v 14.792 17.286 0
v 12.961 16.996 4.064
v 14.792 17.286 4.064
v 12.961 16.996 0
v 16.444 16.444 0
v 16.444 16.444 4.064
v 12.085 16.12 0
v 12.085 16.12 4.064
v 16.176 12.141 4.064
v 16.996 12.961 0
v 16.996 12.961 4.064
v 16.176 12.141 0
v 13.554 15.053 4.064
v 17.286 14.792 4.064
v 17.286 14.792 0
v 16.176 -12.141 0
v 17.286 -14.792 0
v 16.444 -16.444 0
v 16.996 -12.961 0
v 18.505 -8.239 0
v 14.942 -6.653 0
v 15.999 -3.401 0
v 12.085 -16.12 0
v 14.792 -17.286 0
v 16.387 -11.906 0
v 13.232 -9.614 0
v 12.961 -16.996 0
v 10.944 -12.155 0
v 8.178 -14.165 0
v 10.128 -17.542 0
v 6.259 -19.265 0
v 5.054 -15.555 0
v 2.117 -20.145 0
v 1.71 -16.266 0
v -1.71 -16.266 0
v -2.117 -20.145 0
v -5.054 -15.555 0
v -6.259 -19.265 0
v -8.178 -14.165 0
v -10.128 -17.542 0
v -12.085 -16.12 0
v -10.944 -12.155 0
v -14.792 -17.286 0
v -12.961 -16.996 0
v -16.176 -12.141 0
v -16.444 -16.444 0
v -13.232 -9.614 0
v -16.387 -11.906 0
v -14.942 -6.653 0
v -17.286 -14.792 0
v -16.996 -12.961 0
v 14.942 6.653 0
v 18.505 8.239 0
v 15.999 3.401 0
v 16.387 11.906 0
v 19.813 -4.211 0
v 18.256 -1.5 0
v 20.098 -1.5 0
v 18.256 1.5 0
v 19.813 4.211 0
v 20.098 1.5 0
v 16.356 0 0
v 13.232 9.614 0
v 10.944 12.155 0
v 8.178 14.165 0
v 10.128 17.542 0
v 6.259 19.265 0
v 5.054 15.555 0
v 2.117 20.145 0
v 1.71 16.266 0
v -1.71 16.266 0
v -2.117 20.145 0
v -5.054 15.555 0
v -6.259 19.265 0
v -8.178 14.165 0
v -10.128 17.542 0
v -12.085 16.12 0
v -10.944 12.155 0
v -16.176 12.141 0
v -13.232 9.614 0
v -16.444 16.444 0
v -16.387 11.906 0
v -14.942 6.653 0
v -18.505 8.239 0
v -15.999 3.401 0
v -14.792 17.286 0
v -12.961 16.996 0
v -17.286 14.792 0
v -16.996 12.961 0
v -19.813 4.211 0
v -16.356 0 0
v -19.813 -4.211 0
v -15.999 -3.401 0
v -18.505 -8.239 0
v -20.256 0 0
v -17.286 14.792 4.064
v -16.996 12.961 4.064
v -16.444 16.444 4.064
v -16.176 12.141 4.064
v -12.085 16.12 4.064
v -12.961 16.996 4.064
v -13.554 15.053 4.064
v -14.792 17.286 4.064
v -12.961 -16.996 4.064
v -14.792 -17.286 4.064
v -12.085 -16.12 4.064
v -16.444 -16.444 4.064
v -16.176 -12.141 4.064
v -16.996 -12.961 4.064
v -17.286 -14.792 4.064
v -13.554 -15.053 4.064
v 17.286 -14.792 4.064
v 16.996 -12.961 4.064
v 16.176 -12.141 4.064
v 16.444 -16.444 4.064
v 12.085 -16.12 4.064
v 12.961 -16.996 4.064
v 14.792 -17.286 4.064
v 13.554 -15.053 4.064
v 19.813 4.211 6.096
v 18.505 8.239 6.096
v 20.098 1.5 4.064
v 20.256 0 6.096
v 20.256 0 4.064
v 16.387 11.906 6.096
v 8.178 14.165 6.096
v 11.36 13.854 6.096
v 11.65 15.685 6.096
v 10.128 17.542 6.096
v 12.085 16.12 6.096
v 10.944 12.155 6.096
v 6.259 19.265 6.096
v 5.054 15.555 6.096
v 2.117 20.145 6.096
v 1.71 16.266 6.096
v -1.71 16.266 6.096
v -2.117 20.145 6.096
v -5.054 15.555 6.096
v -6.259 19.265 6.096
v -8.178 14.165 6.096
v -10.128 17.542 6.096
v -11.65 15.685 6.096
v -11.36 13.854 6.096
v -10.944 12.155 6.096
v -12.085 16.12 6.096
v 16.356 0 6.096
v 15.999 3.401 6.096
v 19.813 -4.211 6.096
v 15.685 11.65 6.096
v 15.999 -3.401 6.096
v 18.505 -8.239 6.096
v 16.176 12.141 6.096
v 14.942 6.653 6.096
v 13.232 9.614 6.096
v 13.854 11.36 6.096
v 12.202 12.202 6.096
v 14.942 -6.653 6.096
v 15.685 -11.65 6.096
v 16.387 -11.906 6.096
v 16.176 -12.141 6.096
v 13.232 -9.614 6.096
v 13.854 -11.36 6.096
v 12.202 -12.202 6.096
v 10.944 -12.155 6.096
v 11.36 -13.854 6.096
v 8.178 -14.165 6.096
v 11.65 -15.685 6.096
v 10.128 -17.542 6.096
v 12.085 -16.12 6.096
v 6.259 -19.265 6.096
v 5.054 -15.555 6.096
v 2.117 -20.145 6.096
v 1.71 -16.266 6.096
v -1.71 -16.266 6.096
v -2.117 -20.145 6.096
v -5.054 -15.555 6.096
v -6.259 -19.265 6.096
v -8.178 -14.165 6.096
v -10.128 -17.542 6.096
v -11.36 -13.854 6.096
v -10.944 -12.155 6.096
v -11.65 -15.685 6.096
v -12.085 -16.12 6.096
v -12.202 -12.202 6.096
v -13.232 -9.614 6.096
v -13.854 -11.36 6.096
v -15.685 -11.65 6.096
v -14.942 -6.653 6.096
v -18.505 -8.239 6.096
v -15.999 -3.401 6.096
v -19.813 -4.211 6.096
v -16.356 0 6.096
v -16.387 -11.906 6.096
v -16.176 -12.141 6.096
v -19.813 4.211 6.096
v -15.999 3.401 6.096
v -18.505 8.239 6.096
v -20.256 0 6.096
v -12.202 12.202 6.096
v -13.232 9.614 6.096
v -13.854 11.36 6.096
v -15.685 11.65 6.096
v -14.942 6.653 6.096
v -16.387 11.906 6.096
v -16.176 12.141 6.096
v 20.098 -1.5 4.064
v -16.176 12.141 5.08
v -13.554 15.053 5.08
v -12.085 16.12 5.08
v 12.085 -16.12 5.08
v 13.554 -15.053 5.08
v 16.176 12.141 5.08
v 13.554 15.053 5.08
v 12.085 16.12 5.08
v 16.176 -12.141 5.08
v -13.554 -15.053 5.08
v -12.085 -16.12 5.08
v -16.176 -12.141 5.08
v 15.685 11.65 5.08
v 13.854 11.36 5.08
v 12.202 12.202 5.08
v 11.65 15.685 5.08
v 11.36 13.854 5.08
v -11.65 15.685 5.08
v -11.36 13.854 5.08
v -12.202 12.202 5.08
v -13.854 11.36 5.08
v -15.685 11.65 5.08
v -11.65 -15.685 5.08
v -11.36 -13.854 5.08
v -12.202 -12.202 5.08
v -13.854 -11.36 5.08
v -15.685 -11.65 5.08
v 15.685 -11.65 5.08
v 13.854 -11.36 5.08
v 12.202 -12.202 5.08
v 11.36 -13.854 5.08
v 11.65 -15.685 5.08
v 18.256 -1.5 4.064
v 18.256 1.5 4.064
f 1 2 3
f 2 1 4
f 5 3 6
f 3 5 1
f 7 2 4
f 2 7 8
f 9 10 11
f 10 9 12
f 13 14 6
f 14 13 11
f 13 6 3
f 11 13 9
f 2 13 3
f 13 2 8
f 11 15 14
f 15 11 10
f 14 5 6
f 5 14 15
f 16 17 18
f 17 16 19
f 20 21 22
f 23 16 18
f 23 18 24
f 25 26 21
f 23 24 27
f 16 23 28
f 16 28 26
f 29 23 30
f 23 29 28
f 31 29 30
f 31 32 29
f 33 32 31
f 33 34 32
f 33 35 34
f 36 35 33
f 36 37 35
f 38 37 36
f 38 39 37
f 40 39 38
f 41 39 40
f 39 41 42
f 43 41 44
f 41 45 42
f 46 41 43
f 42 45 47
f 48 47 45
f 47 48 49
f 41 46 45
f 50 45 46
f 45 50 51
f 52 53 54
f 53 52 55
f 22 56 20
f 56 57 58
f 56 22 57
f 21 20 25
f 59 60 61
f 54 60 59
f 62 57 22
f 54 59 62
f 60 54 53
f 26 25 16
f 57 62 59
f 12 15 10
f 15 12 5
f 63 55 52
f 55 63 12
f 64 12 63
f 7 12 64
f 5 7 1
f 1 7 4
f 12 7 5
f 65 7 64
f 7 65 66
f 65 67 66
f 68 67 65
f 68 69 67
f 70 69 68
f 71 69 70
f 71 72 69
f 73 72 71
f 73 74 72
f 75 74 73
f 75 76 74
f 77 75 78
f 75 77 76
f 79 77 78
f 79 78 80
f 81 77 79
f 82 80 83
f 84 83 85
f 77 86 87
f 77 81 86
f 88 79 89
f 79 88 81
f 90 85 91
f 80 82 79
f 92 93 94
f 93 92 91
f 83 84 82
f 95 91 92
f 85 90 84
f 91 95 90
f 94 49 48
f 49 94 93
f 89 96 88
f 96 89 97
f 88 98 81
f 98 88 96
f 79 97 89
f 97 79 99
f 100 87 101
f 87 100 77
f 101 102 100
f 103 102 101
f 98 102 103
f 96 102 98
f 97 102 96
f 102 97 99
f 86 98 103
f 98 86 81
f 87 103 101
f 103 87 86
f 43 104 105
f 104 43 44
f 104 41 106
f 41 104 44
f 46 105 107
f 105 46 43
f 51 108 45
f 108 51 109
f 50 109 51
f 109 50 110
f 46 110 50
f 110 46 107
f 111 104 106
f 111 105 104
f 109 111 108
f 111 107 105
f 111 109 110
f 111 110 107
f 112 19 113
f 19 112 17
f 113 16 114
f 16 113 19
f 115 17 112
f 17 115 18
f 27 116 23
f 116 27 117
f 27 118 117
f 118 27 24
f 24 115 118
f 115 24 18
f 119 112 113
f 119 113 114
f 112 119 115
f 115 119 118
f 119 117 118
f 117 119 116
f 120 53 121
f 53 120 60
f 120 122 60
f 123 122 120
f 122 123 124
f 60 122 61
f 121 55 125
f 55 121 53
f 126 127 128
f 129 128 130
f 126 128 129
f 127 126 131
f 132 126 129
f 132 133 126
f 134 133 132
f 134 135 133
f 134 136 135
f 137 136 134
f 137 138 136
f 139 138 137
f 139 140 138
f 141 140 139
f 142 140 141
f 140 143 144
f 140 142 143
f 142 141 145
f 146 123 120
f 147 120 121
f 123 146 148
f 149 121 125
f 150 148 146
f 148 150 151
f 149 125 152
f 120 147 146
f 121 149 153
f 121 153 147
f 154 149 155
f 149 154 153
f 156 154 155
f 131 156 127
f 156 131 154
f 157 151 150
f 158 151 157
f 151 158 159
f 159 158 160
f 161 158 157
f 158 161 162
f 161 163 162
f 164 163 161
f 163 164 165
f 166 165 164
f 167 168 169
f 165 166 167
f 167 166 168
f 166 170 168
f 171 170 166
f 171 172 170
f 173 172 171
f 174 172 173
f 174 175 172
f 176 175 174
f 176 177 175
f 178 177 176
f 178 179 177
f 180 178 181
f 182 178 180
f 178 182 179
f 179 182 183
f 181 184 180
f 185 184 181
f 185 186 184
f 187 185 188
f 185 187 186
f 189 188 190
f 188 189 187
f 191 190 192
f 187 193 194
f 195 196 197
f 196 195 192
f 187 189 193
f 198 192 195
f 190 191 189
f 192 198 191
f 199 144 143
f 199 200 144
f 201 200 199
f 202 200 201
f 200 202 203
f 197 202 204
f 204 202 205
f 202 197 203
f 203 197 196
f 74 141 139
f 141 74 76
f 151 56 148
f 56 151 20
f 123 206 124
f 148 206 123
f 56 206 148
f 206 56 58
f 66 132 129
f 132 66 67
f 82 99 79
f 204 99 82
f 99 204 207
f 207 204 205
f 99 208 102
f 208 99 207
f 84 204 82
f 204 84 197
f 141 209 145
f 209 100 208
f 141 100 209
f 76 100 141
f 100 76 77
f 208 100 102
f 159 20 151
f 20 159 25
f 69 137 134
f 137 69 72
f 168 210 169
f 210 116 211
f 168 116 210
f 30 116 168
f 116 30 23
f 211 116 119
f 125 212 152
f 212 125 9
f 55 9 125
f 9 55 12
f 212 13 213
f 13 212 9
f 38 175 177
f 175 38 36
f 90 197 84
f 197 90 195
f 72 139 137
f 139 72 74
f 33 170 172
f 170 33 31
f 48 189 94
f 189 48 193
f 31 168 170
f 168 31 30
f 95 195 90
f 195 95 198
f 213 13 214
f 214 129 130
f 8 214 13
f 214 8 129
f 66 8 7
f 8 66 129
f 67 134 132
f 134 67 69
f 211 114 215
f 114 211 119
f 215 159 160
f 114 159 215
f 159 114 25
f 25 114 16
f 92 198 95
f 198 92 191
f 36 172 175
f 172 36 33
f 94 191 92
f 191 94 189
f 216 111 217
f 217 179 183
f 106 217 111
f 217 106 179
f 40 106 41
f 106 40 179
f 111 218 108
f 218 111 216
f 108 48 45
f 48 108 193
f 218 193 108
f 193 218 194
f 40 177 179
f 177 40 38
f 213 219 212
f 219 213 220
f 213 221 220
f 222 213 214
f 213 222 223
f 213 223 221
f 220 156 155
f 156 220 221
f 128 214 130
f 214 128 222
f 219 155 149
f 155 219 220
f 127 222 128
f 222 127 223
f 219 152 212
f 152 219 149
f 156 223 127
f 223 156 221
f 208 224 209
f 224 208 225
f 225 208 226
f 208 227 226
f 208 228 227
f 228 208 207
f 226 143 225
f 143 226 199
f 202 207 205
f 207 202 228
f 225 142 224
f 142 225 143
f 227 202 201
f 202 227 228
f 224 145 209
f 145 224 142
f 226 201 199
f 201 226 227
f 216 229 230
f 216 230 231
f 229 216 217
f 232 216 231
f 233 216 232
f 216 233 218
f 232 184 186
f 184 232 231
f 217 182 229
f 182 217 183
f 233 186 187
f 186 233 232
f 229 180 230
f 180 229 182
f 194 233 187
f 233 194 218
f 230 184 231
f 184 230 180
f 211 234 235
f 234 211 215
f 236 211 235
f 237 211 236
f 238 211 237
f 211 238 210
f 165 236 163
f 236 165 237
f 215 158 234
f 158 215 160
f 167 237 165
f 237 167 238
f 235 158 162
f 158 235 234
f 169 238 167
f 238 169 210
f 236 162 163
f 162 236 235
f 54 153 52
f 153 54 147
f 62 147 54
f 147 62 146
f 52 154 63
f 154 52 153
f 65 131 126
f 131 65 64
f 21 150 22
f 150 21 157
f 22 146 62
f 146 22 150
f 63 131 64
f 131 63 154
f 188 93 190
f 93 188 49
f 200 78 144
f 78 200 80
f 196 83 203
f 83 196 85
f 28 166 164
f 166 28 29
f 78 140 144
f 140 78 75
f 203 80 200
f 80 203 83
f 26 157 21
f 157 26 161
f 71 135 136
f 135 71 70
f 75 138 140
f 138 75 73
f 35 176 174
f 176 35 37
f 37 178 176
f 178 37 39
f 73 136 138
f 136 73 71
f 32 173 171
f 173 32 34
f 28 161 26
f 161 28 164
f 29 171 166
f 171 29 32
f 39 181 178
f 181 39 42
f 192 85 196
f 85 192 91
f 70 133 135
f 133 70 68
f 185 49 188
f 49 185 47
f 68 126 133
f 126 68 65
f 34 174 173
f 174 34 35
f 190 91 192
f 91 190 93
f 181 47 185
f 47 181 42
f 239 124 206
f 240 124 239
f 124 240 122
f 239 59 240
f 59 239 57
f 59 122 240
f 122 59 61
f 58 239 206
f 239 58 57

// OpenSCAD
// Basic Display Mount - Generic GC9A01 Mounting Bracket
// Reusable mounting solution for 1.28" circular displays

module display_basic_mount() {
    diameter = 32.512;
    thickness = 2.032;
    mount_holes = 4;
    hole_diameter = 2.54;
    hole_spacing = 27.94;
    
    difference() {
        // Main mounting ring with reinforcement tabs
        union() {
            cylinder(h=thickness*3, d=diameter+8);
            // Reinforcement tabs for case mounting
            for(i=[0:3]) {
                rotate([0, 0, i*90 + 45]) {
                    translate([(diameter+8)/2, 0, 0])
                        cylinder(h=thickness*2, d=6);
                }
            }
        }
        
        // Display cutout (tight fit)
        translate([0,0,-1]) 
            cylinder(h=thickness*3+2, d=diameter+0.2);
        
        // Display mounting holes
        for(i=[0:mount_holes-1]) {
            rotate([0, 0, i*(360/mount_holes)]) {
                translate([hole_spacing/2, 0, -1])
                    cylinder(h=thickness*3+2, d=hole_diameter);
            }
        }
        
        // Case mounting holes (M3 screws in reinforcement tabs)
        for(i=[0:3]) {
            rotate([0, 0, i*90 + 45]) {
                translate([(diameter+8)/2, 0, thickness*2.5])
                    cylinder(h=thickness+1, d=3.2);
                // Countersink
                translate([(diameter+8)/2, 0, thickness*2.5])
                    cylinder(h=2, d=6);
            }
        }
        
        // Cable management channel
        translate([diameter/2 + 4, 0, thickness])
            cube([4, 3, thickness*2], center=true);
    }
}

// Generate the mount
display_basic_mount();
